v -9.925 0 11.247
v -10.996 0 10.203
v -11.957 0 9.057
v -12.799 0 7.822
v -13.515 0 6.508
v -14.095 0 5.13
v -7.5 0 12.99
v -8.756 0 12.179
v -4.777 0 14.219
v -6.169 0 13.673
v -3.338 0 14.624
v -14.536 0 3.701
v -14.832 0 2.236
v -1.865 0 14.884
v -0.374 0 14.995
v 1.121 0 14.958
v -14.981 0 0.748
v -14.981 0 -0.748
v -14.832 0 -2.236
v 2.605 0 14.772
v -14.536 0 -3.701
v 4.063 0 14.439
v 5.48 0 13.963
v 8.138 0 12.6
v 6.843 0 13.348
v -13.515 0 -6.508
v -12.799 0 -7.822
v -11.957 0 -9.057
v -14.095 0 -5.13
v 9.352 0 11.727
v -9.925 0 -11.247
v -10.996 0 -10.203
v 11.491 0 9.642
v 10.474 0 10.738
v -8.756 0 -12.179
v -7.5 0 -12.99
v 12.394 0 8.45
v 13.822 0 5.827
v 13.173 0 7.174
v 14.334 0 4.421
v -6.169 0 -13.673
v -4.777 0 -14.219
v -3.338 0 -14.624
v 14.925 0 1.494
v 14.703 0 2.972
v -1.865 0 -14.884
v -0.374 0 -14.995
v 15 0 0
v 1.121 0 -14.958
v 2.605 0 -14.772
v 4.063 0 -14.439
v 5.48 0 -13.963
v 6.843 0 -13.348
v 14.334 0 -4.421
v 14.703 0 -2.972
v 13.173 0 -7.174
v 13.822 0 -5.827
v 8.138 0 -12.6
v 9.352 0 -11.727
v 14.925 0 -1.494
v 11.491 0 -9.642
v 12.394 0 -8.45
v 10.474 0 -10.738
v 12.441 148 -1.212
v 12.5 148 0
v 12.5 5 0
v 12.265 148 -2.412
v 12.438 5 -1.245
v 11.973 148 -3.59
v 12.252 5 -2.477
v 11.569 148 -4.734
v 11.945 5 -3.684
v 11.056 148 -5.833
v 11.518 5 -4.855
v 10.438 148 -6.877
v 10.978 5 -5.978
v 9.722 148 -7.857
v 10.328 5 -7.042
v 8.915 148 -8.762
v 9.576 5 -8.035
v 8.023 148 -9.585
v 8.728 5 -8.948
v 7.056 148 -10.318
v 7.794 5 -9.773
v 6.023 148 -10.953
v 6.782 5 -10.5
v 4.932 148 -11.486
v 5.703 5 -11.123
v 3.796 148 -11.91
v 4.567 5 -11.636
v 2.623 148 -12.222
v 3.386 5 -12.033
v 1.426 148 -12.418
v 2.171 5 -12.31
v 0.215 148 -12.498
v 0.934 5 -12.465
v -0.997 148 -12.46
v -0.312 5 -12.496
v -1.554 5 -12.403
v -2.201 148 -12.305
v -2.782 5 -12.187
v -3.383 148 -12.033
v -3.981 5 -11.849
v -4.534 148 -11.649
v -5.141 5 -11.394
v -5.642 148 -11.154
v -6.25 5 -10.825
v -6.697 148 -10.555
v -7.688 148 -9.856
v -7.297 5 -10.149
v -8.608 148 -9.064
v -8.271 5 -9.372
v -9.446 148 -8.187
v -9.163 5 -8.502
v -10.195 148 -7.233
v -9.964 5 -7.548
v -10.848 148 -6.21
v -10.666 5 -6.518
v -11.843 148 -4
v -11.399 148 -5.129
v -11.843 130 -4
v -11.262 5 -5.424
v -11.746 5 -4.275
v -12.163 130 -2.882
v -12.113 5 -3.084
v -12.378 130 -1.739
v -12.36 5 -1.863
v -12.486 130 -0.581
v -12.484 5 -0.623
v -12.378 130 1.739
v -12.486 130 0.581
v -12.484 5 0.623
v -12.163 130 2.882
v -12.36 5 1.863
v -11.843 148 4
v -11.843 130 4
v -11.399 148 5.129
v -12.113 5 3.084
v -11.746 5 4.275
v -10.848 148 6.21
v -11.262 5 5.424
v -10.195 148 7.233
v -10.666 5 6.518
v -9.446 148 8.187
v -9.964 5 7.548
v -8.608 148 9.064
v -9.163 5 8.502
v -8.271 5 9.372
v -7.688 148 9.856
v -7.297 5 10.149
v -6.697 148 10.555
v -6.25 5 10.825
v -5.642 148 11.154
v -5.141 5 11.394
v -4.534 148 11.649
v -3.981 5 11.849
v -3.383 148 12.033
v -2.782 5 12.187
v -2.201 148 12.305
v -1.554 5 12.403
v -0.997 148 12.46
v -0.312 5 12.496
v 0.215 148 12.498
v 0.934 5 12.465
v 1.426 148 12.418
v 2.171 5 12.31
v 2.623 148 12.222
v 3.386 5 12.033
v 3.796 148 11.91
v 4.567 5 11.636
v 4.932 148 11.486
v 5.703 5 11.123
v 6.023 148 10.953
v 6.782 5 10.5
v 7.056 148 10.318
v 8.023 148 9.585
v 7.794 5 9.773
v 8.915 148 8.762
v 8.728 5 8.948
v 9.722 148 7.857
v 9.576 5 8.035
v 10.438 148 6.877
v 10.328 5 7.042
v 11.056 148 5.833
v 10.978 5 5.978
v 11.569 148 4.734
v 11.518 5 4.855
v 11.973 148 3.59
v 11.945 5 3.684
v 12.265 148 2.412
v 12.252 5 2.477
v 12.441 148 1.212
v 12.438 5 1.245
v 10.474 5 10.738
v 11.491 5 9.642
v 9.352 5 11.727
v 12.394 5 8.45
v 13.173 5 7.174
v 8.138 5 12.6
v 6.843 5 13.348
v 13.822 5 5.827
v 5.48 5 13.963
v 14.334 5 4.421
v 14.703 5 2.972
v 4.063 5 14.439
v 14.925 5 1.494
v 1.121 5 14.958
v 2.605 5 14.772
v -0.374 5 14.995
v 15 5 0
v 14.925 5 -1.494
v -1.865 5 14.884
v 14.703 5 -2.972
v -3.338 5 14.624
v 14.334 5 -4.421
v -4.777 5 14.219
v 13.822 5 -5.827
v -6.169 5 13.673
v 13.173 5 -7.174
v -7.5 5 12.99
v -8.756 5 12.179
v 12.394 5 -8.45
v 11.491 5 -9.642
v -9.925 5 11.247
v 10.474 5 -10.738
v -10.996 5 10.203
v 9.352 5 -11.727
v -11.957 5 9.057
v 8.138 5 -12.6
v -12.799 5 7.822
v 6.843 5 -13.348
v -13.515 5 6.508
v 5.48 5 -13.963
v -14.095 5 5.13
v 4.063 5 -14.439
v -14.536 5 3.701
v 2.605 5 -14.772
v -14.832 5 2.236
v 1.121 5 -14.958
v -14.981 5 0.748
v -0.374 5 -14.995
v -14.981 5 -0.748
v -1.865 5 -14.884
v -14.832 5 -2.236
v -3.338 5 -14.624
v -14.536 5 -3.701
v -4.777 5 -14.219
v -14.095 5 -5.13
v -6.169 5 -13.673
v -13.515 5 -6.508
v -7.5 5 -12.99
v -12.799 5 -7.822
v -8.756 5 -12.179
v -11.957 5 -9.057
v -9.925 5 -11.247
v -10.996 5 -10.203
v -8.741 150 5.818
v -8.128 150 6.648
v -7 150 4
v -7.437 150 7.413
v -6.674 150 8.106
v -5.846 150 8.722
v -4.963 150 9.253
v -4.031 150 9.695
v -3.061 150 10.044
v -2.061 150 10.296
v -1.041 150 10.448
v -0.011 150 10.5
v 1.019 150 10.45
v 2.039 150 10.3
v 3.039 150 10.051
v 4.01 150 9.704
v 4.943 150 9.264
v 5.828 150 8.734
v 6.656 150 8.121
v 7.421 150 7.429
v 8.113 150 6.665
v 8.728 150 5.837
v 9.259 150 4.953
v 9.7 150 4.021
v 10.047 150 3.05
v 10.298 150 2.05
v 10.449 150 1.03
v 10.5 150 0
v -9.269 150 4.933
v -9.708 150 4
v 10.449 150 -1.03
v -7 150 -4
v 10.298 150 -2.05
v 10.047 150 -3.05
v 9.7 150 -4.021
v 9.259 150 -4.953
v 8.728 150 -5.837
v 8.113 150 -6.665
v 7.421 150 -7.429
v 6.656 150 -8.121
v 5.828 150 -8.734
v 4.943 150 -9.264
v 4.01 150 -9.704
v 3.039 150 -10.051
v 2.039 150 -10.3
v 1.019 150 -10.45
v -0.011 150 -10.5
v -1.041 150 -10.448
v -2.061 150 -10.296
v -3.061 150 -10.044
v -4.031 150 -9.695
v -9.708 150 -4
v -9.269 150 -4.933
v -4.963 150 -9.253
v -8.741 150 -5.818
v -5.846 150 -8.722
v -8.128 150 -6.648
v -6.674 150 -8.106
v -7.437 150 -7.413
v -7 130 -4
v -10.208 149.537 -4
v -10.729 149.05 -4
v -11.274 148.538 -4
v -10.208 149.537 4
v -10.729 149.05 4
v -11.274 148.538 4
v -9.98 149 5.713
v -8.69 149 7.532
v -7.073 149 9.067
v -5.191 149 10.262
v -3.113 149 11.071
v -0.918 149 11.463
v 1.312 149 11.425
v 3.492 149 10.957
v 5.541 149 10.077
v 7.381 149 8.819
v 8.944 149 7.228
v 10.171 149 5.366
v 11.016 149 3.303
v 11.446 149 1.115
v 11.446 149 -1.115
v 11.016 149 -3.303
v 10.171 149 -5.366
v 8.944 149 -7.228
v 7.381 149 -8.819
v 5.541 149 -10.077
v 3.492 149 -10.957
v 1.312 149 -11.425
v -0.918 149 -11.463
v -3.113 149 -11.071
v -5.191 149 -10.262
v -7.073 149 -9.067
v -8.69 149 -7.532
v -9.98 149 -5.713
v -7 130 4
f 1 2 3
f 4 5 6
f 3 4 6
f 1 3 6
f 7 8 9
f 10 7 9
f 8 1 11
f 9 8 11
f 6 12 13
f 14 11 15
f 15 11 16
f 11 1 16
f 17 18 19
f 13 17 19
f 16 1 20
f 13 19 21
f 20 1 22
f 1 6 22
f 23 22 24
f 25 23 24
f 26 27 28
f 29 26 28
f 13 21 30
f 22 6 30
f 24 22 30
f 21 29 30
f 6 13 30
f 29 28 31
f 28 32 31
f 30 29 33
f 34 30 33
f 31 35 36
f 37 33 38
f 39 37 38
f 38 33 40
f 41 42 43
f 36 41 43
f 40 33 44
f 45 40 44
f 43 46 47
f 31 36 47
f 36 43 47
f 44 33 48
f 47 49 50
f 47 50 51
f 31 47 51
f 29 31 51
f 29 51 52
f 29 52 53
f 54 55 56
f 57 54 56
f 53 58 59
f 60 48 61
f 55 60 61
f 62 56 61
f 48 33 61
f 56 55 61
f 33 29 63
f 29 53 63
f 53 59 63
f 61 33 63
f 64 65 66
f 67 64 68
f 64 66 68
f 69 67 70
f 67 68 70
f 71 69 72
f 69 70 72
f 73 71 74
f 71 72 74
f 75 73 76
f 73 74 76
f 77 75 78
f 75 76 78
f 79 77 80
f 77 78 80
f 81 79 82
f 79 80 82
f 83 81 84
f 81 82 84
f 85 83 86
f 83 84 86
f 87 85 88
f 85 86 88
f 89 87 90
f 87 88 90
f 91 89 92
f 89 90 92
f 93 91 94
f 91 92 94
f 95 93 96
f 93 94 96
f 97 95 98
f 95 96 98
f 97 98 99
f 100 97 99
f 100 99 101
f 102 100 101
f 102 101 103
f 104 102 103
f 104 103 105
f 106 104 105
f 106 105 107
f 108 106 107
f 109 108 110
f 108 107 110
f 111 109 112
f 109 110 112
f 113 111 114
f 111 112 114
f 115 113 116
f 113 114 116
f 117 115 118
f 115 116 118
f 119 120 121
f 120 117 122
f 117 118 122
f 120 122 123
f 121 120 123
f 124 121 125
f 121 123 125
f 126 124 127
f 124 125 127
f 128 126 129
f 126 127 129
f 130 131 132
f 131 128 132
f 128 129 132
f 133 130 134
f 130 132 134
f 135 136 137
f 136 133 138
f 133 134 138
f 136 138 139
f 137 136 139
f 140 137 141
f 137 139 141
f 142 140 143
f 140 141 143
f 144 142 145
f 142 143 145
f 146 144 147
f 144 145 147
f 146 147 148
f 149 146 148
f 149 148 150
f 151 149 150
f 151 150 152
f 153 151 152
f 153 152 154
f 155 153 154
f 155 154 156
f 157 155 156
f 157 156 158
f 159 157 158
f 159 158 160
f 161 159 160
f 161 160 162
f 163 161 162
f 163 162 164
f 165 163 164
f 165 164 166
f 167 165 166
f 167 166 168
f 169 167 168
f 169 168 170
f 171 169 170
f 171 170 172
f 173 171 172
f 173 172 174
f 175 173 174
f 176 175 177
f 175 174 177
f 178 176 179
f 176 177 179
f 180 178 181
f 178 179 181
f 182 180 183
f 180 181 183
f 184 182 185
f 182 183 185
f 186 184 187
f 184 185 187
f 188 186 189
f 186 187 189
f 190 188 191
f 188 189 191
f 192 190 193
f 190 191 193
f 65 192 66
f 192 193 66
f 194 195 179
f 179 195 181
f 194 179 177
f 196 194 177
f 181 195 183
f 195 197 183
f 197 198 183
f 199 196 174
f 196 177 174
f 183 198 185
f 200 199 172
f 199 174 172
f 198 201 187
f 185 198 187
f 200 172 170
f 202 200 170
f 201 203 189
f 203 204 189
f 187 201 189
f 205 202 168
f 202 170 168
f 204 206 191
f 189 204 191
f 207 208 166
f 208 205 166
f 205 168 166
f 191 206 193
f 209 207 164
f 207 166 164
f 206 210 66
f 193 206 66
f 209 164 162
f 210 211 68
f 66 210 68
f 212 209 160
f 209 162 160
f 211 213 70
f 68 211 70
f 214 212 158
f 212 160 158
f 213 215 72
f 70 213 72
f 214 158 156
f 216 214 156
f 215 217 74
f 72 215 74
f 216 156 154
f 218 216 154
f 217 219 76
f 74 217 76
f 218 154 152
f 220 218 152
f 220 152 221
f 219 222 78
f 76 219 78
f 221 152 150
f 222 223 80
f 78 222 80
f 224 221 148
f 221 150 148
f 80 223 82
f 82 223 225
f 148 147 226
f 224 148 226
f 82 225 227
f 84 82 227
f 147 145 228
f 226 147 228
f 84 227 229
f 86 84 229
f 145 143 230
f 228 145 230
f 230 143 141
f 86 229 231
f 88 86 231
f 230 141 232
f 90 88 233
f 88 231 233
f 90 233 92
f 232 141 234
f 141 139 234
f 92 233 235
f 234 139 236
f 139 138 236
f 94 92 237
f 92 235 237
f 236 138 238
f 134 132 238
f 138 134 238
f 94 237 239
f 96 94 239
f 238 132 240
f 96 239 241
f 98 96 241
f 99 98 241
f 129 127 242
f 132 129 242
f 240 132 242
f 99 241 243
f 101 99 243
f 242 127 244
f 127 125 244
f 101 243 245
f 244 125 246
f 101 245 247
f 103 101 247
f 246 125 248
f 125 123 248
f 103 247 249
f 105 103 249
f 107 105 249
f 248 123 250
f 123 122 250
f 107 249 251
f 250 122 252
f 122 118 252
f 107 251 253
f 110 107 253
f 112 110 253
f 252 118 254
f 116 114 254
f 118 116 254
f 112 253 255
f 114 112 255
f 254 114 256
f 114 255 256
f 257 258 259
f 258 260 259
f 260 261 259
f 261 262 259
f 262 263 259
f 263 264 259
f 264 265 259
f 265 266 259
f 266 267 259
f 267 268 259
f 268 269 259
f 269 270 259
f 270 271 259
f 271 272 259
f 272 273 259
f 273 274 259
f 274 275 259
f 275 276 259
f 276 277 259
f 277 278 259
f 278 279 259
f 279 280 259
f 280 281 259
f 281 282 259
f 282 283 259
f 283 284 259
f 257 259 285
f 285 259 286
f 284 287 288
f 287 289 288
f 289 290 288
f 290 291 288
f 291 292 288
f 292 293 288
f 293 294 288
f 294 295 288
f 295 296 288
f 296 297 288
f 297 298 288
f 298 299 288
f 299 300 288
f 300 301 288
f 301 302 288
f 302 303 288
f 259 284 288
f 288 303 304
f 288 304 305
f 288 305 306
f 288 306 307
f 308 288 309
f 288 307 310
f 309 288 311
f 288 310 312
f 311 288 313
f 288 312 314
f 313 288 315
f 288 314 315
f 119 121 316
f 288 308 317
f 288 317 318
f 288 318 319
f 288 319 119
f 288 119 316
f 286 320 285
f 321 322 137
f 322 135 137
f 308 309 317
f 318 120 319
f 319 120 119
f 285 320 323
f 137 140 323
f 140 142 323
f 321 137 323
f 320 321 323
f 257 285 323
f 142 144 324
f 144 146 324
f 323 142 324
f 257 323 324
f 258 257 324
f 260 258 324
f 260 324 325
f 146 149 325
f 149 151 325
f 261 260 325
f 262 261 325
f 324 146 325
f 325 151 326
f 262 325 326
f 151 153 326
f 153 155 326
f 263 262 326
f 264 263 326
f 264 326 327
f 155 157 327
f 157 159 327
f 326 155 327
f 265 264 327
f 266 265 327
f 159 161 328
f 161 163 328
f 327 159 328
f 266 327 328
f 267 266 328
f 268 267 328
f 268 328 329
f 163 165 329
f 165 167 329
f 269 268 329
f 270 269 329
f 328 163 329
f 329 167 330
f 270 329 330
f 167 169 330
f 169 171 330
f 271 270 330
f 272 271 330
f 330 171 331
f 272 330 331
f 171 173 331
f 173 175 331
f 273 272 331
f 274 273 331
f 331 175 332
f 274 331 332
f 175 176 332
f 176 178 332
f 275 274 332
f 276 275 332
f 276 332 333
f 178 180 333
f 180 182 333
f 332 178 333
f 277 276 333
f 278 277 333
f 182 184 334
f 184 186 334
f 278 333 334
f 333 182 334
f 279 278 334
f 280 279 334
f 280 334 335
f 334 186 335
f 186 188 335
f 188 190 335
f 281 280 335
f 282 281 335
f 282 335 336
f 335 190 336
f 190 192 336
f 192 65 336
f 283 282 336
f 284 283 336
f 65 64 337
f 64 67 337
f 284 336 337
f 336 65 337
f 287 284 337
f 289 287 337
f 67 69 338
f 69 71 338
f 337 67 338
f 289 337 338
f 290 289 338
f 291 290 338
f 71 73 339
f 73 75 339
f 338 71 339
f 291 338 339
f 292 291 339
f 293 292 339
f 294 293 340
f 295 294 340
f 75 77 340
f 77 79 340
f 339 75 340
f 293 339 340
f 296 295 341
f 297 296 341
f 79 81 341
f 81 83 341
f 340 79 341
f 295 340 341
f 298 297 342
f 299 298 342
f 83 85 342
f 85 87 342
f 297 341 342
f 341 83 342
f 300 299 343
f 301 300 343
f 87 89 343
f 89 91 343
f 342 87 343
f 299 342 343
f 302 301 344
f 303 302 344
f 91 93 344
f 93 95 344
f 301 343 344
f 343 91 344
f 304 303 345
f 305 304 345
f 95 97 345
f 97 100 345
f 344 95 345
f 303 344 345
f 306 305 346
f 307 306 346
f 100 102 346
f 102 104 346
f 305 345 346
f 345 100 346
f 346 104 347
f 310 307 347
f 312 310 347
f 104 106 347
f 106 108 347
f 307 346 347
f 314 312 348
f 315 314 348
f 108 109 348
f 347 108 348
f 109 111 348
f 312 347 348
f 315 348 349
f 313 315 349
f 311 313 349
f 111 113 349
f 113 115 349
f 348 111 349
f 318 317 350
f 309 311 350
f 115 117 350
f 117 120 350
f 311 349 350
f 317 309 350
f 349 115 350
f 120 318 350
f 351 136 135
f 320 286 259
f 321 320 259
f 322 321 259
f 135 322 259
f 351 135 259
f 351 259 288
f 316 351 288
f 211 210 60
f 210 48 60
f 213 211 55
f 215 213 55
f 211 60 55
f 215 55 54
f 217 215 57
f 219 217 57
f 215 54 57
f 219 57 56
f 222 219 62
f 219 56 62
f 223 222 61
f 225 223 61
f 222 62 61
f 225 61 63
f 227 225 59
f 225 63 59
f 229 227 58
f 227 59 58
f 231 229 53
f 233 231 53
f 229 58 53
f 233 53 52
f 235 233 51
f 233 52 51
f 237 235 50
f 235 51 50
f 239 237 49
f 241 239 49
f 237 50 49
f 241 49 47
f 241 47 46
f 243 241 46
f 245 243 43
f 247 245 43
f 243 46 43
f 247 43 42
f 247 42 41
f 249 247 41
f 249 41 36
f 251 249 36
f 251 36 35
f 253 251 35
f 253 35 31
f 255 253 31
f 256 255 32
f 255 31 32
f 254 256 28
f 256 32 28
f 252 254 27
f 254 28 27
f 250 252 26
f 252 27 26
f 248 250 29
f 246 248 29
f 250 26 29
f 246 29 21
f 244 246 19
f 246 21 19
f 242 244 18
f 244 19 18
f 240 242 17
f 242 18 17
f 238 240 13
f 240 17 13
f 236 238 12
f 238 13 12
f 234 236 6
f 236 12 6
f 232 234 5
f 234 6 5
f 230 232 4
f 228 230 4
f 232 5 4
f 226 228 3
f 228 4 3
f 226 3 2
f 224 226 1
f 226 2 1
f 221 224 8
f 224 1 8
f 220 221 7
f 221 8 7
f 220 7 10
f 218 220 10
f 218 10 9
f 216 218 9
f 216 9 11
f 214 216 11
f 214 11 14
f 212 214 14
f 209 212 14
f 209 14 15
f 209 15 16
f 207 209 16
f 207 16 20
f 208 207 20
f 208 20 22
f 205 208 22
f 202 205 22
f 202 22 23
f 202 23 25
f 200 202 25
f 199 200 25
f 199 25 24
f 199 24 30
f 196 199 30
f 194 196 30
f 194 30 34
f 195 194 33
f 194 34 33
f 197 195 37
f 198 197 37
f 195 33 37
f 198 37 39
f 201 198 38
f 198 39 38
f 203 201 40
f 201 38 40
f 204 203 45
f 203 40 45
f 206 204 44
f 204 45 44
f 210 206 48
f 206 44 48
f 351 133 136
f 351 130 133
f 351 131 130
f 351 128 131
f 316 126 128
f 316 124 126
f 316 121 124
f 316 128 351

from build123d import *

# Parameters (mm, degrees)
ESBO_O3_W             = 8
ESBO_O3_H             = 8
CORTE_EXTRUS_O1_DEPTH = 20
CHANFRO1_SIZE         = 2


with BuildPart() as part:
    # Sketch1 → Revolve1 (revolve)
    with BuildSketch(Plane.XY):
        Polygon((0, 150), (12.5, 150), (12.5, 5), (15, 5), (15, 0), (0, 0), align=None)
    revolve(axis=Axis((0, 0, 0), (0, 1, 0)))

    # Esboço3 → Corte-extrusão1 (cut)
    with BuildSketch(Plane(origin=(0, 150, 0), x_dir=(1, 0, 0), z_dir=(0, 1, 0))):
        with Locations((-11, 0)):
            Rectangle(ESBO_O3_W, ESBO_O3_H)
    extrude(amount=-CORTE_EXTRUS_O1_DEPTH, mode=Mode.SUBTRACT)

    # Chanfro1
    chanfro1_edges = [part.edges().sort_by_distance(p)[0] for p in [
        (2.026821276, 150, -12.33458534),
    ]]
    chamfer(chanfro1_edges, length=CHANFRO1_SIZE)


solid = part.part
